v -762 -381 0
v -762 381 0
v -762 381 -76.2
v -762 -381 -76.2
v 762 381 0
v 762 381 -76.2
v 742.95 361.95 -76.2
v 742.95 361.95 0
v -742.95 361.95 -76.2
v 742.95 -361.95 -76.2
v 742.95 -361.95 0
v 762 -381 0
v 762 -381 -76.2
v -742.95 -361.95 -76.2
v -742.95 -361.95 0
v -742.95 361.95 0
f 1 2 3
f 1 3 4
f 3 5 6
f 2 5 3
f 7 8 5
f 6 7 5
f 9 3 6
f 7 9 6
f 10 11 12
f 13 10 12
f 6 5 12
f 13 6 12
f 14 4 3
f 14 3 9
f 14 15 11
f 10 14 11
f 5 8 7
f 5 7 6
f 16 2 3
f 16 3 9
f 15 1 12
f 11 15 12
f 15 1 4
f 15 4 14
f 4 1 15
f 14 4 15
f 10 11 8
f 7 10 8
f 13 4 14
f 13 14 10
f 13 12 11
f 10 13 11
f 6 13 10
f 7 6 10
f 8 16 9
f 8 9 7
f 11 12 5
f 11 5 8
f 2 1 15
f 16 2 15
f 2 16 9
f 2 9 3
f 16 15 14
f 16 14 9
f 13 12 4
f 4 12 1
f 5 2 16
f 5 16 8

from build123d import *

# Parameters (mm, degrees)
F2_DEPTH = 76.2
F3_DEPTH = 76.2


with BuildPart() as f2:
    # F1 (on Top) → F2 (new body)
    with BuildSketch(Plane.XY):
        Polygon((-762, 381), (-762, -381), (-742.95, -361.95), (-742.95, 361.95), align=None)
    extrude(amount=-F2_DEPTH)


with BuildPart() as f3:
    # F1 (on Top) → F3 (new body)
    with BuildSketch(Plane.XY):
        Polygon((742.95, 361.95), (762, 381), (-762, 381), (-742.95, 361.95), align=None)
    extrude(amount=-F3_DEPTH)


with BuildPart() as f4_1:
    # F4: instance of F3
    add(f3.part.mirror(Plane.XZ))


with BuildPart() as f5_1:
    # F5: instance of F2
    add(f2.part.mirror(Plane.YZ))


solid = Compound([f2.part, f3.part, f4_1.part, f5_1.part])
